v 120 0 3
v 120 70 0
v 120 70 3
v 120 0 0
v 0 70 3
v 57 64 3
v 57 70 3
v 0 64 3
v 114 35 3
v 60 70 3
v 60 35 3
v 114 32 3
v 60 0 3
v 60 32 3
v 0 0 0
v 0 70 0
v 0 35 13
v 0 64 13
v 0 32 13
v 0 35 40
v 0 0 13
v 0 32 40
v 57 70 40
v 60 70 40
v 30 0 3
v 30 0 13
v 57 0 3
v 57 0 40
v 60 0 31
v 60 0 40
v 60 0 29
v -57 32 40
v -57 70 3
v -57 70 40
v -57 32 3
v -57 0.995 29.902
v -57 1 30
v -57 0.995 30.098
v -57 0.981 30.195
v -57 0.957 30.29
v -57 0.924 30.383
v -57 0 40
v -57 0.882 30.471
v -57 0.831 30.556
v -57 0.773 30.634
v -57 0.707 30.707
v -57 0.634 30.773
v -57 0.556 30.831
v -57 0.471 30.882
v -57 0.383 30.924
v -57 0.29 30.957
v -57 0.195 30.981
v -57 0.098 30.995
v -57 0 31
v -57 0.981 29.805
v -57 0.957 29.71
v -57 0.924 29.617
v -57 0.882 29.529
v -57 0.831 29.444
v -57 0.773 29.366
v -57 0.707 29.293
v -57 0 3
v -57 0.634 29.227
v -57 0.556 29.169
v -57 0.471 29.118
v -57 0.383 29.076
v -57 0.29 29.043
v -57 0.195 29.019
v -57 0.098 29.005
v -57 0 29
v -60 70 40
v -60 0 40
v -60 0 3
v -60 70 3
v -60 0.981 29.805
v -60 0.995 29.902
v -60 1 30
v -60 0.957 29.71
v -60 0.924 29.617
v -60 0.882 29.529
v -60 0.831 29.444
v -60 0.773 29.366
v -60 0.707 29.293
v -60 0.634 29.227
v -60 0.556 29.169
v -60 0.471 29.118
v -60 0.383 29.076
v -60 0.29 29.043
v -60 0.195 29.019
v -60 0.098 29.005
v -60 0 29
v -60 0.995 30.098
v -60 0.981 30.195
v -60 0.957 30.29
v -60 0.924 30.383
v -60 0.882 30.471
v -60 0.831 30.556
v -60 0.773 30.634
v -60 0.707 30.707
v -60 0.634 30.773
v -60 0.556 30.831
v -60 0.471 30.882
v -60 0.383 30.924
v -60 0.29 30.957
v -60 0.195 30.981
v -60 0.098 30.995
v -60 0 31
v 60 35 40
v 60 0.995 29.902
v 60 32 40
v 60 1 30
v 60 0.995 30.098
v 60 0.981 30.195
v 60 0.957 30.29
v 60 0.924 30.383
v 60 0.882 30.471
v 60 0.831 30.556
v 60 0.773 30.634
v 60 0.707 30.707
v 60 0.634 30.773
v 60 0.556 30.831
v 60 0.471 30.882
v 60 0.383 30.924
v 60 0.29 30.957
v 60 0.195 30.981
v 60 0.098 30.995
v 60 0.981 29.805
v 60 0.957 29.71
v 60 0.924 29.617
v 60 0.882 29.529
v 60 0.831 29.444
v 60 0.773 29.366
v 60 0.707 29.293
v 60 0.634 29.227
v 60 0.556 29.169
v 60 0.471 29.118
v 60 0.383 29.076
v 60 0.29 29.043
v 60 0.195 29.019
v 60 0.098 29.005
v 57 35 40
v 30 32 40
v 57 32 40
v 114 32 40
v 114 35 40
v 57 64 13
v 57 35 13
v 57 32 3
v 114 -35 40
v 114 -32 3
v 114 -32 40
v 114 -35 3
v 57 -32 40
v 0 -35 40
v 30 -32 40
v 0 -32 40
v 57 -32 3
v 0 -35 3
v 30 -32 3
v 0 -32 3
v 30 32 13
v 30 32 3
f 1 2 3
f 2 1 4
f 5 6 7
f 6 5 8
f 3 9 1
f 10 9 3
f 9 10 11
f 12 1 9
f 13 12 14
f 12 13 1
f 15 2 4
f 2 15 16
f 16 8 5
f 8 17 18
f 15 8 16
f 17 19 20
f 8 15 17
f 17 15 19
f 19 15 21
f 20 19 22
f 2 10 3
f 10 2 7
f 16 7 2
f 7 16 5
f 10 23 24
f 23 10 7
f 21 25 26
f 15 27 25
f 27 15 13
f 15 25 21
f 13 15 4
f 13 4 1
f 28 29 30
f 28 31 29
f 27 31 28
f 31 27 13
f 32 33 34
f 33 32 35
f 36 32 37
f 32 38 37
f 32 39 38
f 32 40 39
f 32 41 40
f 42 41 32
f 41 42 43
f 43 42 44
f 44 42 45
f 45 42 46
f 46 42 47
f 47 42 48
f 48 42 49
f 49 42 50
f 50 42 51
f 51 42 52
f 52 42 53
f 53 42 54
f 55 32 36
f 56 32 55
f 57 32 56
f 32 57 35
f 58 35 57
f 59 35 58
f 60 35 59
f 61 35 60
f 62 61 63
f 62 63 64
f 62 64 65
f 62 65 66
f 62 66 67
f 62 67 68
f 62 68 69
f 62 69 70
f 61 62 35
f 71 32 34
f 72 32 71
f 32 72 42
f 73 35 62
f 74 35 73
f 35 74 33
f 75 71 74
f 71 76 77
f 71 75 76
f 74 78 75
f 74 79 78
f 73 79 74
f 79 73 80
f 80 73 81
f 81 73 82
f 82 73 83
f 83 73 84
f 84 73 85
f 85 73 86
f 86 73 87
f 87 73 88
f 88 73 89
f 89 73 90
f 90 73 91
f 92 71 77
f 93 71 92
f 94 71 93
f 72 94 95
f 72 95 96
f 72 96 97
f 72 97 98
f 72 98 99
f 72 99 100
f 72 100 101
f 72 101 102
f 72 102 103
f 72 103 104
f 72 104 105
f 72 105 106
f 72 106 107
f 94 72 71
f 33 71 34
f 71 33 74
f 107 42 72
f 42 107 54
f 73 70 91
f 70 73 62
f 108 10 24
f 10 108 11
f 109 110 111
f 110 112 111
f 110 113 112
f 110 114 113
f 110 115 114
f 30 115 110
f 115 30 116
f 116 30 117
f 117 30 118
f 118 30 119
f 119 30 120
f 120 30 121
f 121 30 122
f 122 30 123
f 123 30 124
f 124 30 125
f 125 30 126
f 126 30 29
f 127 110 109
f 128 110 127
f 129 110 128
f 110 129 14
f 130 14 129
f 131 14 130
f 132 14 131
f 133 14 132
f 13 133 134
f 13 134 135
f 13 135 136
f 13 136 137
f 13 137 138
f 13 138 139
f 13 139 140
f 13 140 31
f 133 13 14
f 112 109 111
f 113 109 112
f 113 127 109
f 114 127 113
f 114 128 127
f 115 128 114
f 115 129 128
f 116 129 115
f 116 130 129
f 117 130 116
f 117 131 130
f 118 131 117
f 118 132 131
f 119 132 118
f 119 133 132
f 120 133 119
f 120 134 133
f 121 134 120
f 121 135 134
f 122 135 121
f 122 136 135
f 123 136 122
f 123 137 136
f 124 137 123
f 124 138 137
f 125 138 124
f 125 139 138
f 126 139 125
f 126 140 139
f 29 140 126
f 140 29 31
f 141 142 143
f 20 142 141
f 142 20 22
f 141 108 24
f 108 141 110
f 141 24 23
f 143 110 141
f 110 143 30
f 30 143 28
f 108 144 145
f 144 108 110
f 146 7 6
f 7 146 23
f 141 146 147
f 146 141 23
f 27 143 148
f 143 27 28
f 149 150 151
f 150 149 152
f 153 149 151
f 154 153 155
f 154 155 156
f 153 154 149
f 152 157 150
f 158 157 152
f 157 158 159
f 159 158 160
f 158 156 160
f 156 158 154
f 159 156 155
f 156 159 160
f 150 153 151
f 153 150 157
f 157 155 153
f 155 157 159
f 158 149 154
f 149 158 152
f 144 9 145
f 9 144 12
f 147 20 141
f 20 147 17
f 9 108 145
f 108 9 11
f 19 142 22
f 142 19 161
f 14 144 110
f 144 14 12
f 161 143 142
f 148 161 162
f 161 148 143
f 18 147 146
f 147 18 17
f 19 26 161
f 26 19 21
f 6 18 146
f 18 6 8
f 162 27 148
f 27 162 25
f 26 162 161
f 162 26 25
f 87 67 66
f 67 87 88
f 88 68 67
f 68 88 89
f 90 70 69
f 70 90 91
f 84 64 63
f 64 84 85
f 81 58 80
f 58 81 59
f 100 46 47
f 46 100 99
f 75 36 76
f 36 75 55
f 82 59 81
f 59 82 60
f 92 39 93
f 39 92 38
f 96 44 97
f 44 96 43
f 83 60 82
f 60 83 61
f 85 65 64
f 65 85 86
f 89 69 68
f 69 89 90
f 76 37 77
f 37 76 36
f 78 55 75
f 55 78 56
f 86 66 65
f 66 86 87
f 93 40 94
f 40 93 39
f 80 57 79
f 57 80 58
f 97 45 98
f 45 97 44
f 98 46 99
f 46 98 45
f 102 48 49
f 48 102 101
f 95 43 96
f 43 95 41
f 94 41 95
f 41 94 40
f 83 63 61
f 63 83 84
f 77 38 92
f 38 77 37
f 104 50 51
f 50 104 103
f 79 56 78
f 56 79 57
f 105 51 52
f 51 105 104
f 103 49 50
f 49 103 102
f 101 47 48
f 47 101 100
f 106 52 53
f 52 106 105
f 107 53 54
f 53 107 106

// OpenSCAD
// Buffer tank for mini horizontal gel-electrophoresis box
outer_x = 120;
outer_y = 70;
outer_z = 40;
wall_thick = 3;
floor_thick = 3;
platform_x = 60;
platform_y = outer_y - 2 * wall_thick; // 64
platform_z_bottom = floor_thick;       // 3
platform_z_top = 13;
platform_h = platform_z_top - platform_z_bottom; // 10
hole_diam = 2;
hole_y = 0;
hole_z = 30;

// Derived dimensions
inner_x = outer_x - 2 * wall_thick;  // 114
inner_y = platform_y;                // 64
inner_z = outer_z - floor_thick;     // 37
wall_h = inner_z;
chamber_x = (inner_x - platform_x) / 2; // 27

$fn = 64;

difference() {
    union() {
        // Floor
        cube([outer_x, outer_y, floor_thick]);
        // Walls
        // Left
        translate([-outer_x / 2, 0, floor_thick]) cube([wall_thick, outer_y, wall_h]);
        // Right
        translate([outer_x / 2 - wall_thick, 0, floor_thick]) cube([wall_thick, outer_y, wall_h]);
        // Front
        translate([0, -outer_y / 2, floor_thick]) cube([inner_x, wall_thick, wall_h]);
        // Back
        translate([0, outer_y / 2 - wall_thick, floor_thick]) cube([inner_x, wall_thick, wall_h]);
        // Platform
        translate([0, 0, platform_z_bottom]) cube([platform_x, platform_y, platform_h]);
    }
    
    // Cutters
    union() {
        // Left chamber cavity (extends 0.1 mm past top to ensure clean cut)
        translate([-outer_x / 2 + wall_thick, -inner_y / 2, floor_thick])
            cube([chamber_x, inner_y, inner_z + 0.1]);
        // Right chamber cavity
        translate([outer_x / 2 - wall_thick - chamber_x, -inner_y / 2, floor_thick])
            cube([chamber_x, inner_y, inner_z + 0.1]);
        // Left electrode hole
        translate([-outer_x / 2, hole_y, hole_z])
            rotate([0, 90, 0]) cylinder(d=hole_diam, h=wall_thick + 0.1);
        // Right electrode hole
        translate([outer_x / 2, hole_y, hole_z])
            rotate([0, 90, 0]) cylinder(d=hole_diam, h=wall_thick + 0.1);
    }
}
